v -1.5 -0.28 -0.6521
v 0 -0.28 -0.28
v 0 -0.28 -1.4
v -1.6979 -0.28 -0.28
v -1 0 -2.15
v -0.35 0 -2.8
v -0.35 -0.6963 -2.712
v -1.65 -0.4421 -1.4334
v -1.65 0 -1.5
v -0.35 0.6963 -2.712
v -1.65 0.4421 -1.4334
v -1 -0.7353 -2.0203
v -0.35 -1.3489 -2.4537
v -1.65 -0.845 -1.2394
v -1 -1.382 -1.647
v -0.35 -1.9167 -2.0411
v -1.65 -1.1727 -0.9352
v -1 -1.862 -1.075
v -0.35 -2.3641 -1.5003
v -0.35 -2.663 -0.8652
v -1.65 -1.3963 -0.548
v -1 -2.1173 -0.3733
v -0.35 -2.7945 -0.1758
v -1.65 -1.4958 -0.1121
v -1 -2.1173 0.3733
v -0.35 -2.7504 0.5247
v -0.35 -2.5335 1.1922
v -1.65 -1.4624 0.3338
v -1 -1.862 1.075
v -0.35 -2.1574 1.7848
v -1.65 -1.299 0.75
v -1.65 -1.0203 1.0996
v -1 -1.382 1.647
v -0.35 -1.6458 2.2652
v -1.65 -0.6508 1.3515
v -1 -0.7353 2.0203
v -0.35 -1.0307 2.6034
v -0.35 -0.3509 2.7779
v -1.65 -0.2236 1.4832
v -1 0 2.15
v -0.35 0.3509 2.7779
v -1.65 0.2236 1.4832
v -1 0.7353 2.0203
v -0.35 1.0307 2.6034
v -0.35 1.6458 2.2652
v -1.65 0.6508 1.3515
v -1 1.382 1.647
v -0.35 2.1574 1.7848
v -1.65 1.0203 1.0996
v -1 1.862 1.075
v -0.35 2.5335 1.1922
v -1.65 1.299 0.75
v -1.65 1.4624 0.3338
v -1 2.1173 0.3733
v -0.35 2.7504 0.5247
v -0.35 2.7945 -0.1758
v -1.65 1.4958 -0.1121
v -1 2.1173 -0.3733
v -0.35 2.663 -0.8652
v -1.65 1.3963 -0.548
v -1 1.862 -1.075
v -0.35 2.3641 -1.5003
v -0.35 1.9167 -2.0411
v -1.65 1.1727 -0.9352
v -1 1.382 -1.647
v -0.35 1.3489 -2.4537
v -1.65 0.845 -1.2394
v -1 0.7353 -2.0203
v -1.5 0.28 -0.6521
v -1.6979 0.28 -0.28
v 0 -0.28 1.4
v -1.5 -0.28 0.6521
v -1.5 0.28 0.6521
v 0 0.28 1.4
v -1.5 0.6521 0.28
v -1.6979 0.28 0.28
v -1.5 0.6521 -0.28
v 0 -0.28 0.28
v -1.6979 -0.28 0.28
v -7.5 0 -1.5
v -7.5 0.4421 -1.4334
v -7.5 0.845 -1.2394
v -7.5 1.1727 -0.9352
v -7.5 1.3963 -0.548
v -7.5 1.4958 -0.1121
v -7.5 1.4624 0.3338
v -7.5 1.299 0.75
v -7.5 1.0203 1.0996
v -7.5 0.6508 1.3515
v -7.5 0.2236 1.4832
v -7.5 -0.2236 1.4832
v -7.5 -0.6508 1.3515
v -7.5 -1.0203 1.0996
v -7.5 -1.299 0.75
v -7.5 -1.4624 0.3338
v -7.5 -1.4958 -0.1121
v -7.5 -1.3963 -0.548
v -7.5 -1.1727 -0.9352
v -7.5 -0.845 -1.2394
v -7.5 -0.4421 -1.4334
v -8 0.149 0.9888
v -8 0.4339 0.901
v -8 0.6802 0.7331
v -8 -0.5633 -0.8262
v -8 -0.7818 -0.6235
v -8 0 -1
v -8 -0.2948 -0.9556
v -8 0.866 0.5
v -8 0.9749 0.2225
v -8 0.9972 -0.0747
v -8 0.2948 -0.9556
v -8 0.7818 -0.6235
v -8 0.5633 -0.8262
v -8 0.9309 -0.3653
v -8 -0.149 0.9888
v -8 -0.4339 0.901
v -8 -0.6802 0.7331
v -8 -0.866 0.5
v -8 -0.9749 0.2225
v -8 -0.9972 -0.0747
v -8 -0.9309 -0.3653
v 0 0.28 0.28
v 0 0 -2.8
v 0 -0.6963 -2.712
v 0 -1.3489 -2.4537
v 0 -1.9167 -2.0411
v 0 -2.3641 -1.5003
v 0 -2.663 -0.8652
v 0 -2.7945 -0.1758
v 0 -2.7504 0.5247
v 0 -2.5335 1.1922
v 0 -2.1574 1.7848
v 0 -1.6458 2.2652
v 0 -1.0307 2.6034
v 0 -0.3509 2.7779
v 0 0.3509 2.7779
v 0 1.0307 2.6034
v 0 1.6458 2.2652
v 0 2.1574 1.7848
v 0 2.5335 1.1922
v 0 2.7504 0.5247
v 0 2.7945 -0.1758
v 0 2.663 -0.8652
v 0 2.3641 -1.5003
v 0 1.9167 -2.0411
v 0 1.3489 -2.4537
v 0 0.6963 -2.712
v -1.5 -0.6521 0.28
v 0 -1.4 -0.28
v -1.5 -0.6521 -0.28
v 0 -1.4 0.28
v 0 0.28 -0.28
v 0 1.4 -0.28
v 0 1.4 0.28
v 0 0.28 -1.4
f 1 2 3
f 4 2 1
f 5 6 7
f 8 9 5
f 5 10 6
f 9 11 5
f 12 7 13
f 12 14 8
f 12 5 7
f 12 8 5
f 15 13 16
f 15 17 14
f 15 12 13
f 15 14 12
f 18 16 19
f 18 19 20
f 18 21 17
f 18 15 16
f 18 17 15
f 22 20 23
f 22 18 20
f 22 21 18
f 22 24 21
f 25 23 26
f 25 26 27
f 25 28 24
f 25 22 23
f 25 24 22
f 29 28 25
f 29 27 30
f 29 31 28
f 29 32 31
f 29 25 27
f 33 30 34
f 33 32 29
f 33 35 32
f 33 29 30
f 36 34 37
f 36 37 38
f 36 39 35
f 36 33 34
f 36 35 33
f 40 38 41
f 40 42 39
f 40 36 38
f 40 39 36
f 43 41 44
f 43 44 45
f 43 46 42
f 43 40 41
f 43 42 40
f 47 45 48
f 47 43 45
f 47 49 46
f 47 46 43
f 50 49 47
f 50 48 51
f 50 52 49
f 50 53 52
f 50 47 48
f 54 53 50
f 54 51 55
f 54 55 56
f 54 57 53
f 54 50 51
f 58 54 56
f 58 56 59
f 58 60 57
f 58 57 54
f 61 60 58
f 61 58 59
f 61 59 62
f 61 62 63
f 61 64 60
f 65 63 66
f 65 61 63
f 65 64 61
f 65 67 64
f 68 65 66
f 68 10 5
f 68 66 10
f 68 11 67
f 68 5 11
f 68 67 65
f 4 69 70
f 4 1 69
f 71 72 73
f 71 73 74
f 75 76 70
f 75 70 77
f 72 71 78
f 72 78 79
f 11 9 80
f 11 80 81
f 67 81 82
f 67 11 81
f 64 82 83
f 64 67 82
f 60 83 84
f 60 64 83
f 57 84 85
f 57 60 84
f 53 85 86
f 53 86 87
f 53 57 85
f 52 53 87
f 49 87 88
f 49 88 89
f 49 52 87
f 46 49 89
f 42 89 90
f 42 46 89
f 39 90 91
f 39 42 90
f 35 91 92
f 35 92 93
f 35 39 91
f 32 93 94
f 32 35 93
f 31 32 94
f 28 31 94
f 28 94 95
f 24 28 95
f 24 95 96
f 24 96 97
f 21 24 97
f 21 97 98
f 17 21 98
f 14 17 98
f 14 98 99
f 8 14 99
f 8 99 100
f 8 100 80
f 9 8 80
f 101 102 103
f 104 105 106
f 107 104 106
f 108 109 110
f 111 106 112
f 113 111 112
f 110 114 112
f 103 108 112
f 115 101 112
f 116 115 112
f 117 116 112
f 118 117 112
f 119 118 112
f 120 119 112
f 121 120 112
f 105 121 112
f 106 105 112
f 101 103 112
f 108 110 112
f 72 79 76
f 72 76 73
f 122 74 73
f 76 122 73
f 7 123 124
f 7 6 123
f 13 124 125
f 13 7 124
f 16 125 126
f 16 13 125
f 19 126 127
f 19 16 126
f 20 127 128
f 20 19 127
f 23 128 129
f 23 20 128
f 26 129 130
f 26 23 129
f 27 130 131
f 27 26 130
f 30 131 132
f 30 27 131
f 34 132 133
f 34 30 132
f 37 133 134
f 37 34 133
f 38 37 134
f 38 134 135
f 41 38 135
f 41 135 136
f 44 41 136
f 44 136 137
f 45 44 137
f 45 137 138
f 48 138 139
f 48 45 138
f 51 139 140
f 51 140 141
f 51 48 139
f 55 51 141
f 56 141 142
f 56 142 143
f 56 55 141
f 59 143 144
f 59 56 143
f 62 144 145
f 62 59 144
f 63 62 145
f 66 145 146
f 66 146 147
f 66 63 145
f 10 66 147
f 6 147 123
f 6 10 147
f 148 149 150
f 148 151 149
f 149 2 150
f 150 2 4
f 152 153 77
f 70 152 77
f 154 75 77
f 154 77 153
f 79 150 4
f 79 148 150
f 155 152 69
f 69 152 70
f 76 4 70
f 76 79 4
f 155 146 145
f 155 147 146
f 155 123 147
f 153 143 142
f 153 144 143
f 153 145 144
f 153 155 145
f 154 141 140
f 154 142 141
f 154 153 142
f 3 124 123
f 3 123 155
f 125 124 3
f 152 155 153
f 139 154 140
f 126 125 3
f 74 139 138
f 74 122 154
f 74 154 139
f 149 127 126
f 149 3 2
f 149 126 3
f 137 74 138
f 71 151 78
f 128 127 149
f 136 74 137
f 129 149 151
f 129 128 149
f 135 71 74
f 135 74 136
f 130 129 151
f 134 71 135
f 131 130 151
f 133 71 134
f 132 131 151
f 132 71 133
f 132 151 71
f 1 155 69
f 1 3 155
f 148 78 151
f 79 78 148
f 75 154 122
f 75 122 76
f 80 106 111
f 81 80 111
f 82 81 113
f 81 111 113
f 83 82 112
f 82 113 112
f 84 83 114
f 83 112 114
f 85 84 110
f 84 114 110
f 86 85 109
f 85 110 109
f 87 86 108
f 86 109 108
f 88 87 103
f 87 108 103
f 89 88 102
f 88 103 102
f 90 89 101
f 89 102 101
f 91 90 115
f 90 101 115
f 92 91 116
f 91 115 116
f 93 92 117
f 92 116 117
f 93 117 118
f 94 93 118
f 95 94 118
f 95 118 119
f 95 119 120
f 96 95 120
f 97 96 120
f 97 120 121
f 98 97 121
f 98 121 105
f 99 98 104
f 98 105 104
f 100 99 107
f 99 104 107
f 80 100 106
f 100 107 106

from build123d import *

# Parameters (mm, degrees)
SKETCH_1_R               = 1.5
EXTRUDE_606_DEPTH        = 8
CHAMFER_689_SIZE         = 0.5
CUT_EXTRUDE_1_DEPTH      = 0.28
PATTERN_CIRCULAR_1_COUNT = 2
PATTERN_CIRCULAR_1_ANGLE = 90


with BuildPart() as part:
    # Эскиз1 → Extrude 606 (new body)
    with BuildSketch(Plane(origin=(0, 0, 0), x_dir=(0, 0, -1), z_dir=(1, 0, 0))):
        Circle(SKETCH_1_R)
    extrude(amount=-EXTRUDE_606_DEPTH)

    # Chamfer 689
    chamfer_689_edges = [part.edges().sort_by_distance(p)[0] for p in [
        (-8, 0, 1.5),
    ]]
    chamfer(chamfer_689_edges, length=CHAMFER_689_SIZE)

    # Эскиз7 → Revolve 901 (revolve)
    with BuildSketch(Plane.XY, mode=Mode.PRIVATE) as revolve_901_sk:
        Polygon((0, 0), (0, 2.8), (-0.35, 2.8), (-1.65, 1.5), (-1.65, 0), align=None)
    revolve(revolve_901_sk.sketch.rotate(Axis((0, 0, 0), (-1, 0, 0)), 90), axis=Axis((0, 0, 0), (-1, 0, 0)))

    # Эскиз10 → Вырез-Вытянуть1 (cut, symmetric)
    with BuildSketch(Plane.XY):
        Polygon((0, 1.4), (0, -1.4), (-1.5, -0.652127588), (-1.697863748, -0.28), (-1.697863748, 0.28), (-1.5, 0.652127588), align=None)
    cut_extrude_1 = extrude(amount=CUT_EXTRUDE_1_DEPTH, both=True, mode=Mode.SUBTRACT)

    # Круговой массив1: Вырез-Вытянуть1 ×2 about axis
    pattern_circular_1_axis = Axis((0, 0, 0), (1, 0, 0))
    for i in range(1, PATTERN_CIRCULAR_1_COUNT):
        add(cut_extrude_1.rotate(pattern_circular_1_axis, i * PATTERN_CIRCULAR_1_ANGLE / (PATTERN_CIRCULAR_1_COUNT - 1)), mode=Mode.SUBTRACT)


solid = part.part
